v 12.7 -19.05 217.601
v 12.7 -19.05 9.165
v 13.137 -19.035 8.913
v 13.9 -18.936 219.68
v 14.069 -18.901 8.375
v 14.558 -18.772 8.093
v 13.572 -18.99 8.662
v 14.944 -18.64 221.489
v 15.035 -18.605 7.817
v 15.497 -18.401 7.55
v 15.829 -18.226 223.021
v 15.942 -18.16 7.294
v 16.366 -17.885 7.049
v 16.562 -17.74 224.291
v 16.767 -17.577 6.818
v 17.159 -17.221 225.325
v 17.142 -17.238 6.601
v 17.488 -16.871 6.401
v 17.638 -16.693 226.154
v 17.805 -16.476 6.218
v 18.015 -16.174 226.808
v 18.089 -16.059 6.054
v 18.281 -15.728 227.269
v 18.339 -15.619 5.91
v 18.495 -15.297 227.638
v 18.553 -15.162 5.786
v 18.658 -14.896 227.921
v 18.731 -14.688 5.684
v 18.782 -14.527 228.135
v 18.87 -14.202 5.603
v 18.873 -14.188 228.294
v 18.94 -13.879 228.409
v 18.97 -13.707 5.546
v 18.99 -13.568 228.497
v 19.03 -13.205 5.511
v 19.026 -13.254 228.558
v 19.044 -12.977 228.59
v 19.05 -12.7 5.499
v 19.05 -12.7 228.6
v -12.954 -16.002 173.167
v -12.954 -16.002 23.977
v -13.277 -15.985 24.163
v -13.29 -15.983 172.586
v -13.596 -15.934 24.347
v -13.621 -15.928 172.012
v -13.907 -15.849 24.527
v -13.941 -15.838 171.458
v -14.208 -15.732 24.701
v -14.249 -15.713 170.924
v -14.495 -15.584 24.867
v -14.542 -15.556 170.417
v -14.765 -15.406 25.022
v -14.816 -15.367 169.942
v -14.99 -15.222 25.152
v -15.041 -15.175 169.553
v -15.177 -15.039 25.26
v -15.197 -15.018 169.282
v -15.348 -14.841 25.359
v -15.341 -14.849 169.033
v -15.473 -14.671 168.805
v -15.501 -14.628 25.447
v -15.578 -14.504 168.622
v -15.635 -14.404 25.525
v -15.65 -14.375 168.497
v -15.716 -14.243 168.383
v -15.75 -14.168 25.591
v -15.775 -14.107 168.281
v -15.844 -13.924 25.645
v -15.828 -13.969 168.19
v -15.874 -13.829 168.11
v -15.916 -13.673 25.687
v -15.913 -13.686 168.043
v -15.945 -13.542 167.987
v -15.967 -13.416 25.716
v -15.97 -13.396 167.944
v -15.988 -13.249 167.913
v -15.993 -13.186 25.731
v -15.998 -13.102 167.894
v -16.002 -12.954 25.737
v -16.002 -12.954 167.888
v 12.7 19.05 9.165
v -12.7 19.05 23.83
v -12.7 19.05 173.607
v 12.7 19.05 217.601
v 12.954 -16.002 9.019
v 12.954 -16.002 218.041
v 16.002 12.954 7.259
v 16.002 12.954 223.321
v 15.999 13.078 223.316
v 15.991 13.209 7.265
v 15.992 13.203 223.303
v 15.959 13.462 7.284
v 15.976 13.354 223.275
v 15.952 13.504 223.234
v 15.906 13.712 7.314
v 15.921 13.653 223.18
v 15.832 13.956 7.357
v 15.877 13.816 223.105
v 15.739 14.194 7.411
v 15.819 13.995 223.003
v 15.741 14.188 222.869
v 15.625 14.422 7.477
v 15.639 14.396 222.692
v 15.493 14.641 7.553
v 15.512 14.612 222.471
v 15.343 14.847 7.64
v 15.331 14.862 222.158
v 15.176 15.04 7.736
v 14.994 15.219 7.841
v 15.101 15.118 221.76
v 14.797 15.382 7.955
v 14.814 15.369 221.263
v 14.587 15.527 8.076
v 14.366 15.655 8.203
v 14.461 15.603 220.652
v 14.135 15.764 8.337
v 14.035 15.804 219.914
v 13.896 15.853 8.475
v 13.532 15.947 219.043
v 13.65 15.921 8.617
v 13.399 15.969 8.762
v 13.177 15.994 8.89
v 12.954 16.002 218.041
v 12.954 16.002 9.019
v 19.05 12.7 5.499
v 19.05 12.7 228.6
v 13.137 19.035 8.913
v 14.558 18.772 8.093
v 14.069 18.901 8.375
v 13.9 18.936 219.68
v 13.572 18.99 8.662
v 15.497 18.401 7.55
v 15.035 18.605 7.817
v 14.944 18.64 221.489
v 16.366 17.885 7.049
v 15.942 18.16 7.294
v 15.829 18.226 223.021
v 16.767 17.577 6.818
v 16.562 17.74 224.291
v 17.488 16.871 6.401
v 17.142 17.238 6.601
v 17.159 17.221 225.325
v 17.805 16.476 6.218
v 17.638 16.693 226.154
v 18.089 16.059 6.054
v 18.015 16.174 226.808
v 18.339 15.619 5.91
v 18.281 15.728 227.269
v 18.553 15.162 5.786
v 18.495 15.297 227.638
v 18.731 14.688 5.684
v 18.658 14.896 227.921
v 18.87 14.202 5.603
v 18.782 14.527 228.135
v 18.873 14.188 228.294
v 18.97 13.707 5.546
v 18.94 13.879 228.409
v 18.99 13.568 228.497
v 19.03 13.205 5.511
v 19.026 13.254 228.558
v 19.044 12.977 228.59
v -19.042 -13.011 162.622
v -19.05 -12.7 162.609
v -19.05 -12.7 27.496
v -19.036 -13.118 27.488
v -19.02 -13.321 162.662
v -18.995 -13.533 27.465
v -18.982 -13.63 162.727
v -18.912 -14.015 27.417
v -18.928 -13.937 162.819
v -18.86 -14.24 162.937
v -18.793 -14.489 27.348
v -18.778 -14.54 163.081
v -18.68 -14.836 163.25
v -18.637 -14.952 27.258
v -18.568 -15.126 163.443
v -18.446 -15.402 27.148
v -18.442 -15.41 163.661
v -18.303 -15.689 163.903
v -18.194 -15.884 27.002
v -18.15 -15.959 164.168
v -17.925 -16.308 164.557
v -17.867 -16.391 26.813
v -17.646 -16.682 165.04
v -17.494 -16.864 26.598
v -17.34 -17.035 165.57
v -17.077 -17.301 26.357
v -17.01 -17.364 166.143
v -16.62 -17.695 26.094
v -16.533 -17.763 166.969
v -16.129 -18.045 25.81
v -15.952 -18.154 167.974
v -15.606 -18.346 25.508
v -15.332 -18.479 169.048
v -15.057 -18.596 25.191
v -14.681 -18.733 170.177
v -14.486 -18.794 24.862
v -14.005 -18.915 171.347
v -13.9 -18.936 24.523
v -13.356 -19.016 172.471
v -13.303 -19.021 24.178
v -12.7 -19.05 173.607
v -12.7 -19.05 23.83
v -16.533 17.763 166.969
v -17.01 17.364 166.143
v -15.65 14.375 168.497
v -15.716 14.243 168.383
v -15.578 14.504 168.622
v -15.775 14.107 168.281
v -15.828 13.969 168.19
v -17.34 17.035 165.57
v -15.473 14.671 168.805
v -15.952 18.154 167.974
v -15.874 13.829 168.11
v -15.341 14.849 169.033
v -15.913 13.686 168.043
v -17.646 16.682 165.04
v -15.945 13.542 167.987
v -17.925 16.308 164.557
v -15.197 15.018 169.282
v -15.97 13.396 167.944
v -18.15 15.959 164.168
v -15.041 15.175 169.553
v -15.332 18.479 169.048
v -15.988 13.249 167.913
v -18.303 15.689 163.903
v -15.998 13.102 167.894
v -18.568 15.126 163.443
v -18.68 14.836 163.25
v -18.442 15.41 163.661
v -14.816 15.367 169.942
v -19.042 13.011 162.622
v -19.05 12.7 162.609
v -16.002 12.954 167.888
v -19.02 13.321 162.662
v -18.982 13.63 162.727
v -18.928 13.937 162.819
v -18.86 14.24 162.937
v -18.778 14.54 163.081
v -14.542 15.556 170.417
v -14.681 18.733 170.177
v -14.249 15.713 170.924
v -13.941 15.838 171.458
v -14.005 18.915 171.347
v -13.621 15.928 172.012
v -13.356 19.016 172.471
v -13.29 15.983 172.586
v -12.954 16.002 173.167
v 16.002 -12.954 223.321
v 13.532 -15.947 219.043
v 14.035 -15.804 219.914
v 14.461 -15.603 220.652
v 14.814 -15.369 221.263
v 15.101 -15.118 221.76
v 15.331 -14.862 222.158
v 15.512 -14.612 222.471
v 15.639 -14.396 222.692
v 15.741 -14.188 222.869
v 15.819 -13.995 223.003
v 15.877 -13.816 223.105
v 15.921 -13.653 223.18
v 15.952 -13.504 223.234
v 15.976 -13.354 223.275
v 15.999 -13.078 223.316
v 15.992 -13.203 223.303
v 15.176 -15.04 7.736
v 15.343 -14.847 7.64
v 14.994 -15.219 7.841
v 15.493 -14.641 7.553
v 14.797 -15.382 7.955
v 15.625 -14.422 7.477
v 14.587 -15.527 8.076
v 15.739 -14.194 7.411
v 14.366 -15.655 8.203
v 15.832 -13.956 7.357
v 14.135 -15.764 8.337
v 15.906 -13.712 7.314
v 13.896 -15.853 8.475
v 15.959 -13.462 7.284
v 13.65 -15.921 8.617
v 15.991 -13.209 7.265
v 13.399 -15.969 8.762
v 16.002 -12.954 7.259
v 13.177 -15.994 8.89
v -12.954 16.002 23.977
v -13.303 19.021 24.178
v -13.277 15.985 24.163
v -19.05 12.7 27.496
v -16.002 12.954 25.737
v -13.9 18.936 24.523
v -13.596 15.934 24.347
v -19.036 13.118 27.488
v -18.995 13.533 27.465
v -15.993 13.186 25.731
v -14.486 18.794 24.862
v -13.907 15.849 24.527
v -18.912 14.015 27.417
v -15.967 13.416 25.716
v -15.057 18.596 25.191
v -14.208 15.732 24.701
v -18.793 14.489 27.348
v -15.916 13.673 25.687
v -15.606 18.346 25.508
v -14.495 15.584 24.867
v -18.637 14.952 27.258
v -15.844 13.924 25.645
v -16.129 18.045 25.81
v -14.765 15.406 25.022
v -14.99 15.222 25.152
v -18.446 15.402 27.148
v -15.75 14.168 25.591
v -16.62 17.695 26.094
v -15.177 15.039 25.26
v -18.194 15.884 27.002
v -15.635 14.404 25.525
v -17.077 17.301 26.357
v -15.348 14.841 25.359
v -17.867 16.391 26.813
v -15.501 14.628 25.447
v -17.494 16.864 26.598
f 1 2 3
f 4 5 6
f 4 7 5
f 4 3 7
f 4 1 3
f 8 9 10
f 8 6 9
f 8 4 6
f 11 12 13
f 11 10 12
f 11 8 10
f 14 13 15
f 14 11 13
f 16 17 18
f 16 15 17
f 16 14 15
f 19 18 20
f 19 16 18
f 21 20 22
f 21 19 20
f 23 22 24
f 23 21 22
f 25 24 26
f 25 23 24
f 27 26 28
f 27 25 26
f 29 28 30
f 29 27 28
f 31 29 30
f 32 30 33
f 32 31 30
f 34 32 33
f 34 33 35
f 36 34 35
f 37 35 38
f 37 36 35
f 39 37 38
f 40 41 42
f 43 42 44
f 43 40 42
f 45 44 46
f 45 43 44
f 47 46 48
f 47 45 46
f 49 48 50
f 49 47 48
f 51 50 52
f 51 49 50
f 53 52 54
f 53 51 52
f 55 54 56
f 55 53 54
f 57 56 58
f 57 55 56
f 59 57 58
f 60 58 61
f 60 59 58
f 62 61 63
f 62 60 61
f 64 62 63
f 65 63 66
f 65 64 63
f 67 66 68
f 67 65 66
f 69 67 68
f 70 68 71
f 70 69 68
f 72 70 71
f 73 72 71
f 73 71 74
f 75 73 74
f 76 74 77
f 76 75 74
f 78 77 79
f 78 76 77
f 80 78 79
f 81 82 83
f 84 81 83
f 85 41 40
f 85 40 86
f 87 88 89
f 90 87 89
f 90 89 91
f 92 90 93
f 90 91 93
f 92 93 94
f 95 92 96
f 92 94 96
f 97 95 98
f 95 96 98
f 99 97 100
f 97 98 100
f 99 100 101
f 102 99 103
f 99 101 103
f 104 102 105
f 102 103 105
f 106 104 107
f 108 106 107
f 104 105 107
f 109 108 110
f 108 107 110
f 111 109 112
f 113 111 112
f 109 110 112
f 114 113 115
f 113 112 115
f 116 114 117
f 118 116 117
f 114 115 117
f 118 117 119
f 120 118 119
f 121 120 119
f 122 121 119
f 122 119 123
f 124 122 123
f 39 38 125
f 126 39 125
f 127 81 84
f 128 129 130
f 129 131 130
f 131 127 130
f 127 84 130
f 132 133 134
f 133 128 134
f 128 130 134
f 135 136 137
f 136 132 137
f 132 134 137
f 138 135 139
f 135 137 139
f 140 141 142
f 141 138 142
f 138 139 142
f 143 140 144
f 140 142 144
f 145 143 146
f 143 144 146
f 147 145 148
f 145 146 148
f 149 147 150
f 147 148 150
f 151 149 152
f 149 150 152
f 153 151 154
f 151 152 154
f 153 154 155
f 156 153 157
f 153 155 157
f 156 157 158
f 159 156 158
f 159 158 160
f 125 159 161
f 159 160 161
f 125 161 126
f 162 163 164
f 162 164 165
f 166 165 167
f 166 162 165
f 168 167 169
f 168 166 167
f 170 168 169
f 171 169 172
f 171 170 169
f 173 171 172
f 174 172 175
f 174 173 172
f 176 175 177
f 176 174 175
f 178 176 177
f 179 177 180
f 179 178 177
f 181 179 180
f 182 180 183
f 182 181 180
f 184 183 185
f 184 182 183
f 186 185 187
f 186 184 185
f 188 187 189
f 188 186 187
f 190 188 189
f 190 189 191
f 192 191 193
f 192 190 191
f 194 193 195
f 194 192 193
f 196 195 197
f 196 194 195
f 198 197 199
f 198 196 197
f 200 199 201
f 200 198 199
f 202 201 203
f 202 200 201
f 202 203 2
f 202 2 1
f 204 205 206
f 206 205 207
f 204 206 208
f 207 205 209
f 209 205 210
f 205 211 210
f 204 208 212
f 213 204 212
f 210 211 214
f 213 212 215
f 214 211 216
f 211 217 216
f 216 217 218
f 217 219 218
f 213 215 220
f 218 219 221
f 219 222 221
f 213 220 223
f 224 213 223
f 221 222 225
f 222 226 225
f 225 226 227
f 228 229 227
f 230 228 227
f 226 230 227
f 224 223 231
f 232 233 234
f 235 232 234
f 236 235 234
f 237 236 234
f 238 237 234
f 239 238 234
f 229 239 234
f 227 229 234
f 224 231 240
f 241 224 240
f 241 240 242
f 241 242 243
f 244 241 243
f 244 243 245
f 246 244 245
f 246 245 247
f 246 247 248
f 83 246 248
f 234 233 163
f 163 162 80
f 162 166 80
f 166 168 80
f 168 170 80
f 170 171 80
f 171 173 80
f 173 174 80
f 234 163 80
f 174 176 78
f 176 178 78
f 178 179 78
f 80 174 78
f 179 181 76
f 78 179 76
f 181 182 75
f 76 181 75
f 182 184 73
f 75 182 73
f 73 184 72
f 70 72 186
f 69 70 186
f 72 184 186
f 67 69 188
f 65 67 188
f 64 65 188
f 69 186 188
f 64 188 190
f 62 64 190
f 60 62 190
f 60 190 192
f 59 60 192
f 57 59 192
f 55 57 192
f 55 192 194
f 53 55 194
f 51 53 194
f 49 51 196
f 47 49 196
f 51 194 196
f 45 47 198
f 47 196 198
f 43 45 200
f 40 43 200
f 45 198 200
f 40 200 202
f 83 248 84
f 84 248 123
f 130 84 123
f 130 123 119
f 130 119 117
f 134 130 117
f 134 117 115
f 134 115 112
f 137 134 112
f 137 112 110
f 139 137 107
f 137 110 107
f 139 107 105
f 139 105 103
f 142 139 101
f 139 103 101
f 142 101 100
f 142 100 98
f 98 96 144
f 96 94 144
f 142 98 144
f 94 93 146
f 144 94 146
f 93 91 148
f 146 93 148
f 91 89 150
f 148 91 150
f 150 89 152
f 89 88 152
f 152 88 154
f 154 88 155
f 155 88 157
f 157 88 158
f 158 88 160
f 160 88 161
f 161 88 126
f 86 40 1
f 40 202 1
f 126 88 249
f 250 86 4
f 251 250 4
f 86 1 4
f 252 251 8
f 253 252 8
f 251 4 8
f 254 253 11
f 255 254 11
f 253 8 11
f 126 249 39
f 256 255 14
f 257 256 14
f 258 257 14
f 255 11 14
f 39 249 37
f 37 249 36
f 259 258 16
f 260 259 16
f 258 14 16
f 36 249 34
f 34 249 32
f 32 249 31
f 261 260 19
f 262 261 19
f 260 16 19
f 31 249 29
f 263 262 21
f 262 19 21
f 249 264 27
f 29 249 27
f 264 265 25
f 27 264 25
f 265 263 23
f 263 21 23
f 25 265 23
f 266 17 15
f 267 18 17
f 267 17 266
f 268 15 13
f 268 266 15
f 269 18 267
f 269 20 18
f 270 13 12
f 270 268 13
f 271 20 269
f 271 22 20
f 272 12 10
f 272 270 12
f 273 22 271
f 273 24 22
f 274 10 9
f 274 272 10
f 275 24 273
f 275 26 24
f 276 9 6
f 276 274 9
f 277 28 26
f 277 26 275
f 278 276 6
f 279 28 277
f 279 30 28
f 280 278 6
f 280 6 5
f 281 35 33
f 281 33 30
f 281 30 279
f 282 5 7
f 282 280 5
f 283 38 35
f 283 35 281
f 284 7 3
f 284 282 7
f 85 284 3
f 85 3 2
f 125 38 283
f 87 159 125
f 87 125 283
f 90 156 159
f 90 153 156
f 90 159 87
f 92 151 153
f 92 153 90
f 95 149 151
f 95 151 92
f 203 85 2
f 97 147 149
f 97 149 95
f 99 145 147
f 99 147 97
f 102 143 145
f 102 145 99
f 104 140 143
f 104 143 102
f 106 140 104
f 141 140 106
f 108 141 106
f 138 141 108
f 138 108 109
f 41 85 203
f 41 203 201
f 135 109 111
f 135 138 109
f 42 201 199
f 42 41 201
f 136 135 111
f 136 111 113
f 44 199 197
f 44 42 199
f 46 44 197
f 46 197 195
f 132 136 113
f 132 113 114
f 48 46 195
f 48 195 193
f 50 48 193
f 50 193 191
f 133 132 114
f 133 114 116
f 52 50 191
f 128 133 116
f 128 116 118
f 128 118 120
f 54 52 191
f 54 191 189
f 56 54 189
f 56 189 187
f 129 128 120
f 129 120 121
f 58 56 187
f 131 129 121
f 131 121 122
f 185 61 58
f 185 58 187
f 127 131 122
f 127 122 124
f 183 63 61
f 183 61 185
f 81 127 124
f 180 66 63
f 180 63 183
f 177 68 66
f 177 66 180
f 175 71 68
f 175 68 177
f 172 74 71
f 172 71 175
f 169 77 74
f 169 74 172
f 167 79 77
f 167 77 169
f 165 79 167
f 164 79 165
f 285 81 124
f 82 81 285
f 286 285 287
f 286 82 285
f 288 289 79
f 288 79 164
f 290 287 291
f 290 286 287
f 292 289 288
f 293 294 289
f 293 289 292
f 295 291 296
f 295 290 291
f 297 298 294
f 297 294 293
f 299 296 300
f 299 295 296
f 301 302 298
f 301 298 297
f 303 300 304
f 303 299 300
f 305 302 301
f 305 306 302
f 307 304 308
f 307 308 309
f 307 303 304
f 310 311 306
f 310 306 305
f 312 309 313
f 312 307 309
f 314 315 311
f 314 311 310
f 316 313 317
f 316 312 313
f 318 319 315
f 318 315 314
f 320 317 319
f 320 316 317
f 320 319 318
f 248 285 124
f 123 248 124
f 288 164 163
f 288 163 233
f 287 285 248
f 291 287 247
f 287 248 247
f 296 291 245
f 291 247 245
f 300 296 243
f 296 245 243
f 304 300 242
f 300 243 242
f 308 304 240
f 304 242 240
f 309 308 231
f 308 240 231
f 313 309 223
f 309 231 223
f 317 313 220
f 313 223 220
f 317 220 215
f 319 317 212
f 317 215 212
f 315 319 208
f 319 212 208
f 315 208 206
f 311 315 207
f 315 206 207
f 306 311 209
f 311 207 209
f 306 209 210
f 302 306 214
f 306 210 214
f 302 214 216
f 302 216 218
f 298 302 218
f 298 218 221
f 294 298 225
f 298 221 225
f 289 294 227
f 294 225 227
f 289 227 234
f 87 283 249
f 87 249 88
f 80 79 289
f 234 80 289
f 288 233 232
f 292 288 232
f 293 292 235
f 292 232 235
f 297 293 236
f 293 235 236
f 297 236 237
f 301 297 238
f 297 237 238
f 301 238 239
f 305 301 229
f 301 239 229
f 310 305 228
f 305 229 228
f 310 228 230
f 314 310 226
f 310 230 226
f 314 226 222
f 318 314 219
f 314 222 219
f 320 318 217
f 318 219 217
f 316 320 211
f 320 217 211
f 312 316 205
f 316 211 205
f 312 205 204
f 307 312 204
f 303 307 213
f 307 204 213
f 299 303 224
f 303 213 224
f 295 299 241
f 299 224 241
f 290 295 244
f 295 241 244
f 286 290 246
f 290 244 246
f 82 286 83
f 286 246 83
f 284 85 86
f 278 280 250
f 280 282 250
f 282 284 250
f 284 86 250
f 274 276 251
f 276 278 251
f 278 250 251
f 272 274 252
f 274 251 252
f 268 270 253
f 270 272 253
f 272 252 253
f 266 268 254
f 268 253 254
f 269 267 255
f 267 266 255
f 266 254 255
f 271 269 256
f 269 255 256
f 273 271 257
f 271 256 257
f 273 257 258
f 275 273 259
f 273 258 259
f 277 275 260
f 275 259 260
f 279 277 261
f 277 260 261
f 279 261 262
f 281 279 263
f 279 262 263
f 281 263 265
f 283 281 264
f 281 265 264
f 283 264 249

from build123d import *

# Parameters (mm, degrees)
F0_W          = 38.1
F0_H          = 38.1
F0_W_2        = 32.004
F0_H_2        = 32.004
F1_DEPTH      = 228.6
F2_R          = 3.048
F3_R          = 6.35
F5_DEPTH      = 19.051
F5_DEPTH_BACK = 19.051
F7_DEPTH      = 19.051
F7_DEPTH_BACK = 19.051


with BuildPart() as f1:
    # F0 (on Top) → F1 (new body)
    with BuildSketch(Plane.XY):
        Rectangle(F0_W, F0_H)
        Rectangle(F0_W_2, F0_H_2, mode=Mode.SUBTRACT)
    extrude(amount=F1_DEPTH)

    # F2
    f2_edges = [f1.edges().sort_by_distance(p)[0] for p in [
        (16.002, 16.002, 114.3),
        (-16.002, 16.002, 114.3),
        (-16.002, -16.002, 114.3),
        (16.002, -16.002, 114.3),
    ]]
    fillet(f2_edges, radius=F2_R)

    # F3
    f3_edges = [f1.edges().sort_by_distance(p)[0] for p in [
        (-19.05, 19.05, 114.3),
        (-19.05, -19.05, 114.3),
        (19.05, -19.05, 114.3),
        (19.05, 19.05, 114.3),
    ]]
    fillet(f3_edges, radius=F3_R)

    # F4 (on Front) → F5 (cut, two sides)
    with BuildSketch(Plane.XZ) as f5_sk:
        Polygon((-19.05, 162.6088642316), (19.05, 228.6), (-19.05, 228.6), align=None)
    extrude(amount=-F5_DEPTH, mode=Mode.SUBTRACT)
    extrude(f5_sk.sketch, amount=F5_DEPTH_BACK, mode=Mode.SUBTRACT)

    # F6 (on Front) → F7 (cut, two sides)
    with BuildSketch(Plane.XZ) as f7_sk:
        Polygon((-19.05, 27.4963065702), (-19.05, 0), (28.575, 0), align=None)
    extrude(amount=-F7_DEPTH, mode=Mode.SUBTRACT)
    extrude(f7_sk.sketch, amount=F7_DEPTH_BACK, mode=Mode.SUBTRACT)


solid = f1.part
